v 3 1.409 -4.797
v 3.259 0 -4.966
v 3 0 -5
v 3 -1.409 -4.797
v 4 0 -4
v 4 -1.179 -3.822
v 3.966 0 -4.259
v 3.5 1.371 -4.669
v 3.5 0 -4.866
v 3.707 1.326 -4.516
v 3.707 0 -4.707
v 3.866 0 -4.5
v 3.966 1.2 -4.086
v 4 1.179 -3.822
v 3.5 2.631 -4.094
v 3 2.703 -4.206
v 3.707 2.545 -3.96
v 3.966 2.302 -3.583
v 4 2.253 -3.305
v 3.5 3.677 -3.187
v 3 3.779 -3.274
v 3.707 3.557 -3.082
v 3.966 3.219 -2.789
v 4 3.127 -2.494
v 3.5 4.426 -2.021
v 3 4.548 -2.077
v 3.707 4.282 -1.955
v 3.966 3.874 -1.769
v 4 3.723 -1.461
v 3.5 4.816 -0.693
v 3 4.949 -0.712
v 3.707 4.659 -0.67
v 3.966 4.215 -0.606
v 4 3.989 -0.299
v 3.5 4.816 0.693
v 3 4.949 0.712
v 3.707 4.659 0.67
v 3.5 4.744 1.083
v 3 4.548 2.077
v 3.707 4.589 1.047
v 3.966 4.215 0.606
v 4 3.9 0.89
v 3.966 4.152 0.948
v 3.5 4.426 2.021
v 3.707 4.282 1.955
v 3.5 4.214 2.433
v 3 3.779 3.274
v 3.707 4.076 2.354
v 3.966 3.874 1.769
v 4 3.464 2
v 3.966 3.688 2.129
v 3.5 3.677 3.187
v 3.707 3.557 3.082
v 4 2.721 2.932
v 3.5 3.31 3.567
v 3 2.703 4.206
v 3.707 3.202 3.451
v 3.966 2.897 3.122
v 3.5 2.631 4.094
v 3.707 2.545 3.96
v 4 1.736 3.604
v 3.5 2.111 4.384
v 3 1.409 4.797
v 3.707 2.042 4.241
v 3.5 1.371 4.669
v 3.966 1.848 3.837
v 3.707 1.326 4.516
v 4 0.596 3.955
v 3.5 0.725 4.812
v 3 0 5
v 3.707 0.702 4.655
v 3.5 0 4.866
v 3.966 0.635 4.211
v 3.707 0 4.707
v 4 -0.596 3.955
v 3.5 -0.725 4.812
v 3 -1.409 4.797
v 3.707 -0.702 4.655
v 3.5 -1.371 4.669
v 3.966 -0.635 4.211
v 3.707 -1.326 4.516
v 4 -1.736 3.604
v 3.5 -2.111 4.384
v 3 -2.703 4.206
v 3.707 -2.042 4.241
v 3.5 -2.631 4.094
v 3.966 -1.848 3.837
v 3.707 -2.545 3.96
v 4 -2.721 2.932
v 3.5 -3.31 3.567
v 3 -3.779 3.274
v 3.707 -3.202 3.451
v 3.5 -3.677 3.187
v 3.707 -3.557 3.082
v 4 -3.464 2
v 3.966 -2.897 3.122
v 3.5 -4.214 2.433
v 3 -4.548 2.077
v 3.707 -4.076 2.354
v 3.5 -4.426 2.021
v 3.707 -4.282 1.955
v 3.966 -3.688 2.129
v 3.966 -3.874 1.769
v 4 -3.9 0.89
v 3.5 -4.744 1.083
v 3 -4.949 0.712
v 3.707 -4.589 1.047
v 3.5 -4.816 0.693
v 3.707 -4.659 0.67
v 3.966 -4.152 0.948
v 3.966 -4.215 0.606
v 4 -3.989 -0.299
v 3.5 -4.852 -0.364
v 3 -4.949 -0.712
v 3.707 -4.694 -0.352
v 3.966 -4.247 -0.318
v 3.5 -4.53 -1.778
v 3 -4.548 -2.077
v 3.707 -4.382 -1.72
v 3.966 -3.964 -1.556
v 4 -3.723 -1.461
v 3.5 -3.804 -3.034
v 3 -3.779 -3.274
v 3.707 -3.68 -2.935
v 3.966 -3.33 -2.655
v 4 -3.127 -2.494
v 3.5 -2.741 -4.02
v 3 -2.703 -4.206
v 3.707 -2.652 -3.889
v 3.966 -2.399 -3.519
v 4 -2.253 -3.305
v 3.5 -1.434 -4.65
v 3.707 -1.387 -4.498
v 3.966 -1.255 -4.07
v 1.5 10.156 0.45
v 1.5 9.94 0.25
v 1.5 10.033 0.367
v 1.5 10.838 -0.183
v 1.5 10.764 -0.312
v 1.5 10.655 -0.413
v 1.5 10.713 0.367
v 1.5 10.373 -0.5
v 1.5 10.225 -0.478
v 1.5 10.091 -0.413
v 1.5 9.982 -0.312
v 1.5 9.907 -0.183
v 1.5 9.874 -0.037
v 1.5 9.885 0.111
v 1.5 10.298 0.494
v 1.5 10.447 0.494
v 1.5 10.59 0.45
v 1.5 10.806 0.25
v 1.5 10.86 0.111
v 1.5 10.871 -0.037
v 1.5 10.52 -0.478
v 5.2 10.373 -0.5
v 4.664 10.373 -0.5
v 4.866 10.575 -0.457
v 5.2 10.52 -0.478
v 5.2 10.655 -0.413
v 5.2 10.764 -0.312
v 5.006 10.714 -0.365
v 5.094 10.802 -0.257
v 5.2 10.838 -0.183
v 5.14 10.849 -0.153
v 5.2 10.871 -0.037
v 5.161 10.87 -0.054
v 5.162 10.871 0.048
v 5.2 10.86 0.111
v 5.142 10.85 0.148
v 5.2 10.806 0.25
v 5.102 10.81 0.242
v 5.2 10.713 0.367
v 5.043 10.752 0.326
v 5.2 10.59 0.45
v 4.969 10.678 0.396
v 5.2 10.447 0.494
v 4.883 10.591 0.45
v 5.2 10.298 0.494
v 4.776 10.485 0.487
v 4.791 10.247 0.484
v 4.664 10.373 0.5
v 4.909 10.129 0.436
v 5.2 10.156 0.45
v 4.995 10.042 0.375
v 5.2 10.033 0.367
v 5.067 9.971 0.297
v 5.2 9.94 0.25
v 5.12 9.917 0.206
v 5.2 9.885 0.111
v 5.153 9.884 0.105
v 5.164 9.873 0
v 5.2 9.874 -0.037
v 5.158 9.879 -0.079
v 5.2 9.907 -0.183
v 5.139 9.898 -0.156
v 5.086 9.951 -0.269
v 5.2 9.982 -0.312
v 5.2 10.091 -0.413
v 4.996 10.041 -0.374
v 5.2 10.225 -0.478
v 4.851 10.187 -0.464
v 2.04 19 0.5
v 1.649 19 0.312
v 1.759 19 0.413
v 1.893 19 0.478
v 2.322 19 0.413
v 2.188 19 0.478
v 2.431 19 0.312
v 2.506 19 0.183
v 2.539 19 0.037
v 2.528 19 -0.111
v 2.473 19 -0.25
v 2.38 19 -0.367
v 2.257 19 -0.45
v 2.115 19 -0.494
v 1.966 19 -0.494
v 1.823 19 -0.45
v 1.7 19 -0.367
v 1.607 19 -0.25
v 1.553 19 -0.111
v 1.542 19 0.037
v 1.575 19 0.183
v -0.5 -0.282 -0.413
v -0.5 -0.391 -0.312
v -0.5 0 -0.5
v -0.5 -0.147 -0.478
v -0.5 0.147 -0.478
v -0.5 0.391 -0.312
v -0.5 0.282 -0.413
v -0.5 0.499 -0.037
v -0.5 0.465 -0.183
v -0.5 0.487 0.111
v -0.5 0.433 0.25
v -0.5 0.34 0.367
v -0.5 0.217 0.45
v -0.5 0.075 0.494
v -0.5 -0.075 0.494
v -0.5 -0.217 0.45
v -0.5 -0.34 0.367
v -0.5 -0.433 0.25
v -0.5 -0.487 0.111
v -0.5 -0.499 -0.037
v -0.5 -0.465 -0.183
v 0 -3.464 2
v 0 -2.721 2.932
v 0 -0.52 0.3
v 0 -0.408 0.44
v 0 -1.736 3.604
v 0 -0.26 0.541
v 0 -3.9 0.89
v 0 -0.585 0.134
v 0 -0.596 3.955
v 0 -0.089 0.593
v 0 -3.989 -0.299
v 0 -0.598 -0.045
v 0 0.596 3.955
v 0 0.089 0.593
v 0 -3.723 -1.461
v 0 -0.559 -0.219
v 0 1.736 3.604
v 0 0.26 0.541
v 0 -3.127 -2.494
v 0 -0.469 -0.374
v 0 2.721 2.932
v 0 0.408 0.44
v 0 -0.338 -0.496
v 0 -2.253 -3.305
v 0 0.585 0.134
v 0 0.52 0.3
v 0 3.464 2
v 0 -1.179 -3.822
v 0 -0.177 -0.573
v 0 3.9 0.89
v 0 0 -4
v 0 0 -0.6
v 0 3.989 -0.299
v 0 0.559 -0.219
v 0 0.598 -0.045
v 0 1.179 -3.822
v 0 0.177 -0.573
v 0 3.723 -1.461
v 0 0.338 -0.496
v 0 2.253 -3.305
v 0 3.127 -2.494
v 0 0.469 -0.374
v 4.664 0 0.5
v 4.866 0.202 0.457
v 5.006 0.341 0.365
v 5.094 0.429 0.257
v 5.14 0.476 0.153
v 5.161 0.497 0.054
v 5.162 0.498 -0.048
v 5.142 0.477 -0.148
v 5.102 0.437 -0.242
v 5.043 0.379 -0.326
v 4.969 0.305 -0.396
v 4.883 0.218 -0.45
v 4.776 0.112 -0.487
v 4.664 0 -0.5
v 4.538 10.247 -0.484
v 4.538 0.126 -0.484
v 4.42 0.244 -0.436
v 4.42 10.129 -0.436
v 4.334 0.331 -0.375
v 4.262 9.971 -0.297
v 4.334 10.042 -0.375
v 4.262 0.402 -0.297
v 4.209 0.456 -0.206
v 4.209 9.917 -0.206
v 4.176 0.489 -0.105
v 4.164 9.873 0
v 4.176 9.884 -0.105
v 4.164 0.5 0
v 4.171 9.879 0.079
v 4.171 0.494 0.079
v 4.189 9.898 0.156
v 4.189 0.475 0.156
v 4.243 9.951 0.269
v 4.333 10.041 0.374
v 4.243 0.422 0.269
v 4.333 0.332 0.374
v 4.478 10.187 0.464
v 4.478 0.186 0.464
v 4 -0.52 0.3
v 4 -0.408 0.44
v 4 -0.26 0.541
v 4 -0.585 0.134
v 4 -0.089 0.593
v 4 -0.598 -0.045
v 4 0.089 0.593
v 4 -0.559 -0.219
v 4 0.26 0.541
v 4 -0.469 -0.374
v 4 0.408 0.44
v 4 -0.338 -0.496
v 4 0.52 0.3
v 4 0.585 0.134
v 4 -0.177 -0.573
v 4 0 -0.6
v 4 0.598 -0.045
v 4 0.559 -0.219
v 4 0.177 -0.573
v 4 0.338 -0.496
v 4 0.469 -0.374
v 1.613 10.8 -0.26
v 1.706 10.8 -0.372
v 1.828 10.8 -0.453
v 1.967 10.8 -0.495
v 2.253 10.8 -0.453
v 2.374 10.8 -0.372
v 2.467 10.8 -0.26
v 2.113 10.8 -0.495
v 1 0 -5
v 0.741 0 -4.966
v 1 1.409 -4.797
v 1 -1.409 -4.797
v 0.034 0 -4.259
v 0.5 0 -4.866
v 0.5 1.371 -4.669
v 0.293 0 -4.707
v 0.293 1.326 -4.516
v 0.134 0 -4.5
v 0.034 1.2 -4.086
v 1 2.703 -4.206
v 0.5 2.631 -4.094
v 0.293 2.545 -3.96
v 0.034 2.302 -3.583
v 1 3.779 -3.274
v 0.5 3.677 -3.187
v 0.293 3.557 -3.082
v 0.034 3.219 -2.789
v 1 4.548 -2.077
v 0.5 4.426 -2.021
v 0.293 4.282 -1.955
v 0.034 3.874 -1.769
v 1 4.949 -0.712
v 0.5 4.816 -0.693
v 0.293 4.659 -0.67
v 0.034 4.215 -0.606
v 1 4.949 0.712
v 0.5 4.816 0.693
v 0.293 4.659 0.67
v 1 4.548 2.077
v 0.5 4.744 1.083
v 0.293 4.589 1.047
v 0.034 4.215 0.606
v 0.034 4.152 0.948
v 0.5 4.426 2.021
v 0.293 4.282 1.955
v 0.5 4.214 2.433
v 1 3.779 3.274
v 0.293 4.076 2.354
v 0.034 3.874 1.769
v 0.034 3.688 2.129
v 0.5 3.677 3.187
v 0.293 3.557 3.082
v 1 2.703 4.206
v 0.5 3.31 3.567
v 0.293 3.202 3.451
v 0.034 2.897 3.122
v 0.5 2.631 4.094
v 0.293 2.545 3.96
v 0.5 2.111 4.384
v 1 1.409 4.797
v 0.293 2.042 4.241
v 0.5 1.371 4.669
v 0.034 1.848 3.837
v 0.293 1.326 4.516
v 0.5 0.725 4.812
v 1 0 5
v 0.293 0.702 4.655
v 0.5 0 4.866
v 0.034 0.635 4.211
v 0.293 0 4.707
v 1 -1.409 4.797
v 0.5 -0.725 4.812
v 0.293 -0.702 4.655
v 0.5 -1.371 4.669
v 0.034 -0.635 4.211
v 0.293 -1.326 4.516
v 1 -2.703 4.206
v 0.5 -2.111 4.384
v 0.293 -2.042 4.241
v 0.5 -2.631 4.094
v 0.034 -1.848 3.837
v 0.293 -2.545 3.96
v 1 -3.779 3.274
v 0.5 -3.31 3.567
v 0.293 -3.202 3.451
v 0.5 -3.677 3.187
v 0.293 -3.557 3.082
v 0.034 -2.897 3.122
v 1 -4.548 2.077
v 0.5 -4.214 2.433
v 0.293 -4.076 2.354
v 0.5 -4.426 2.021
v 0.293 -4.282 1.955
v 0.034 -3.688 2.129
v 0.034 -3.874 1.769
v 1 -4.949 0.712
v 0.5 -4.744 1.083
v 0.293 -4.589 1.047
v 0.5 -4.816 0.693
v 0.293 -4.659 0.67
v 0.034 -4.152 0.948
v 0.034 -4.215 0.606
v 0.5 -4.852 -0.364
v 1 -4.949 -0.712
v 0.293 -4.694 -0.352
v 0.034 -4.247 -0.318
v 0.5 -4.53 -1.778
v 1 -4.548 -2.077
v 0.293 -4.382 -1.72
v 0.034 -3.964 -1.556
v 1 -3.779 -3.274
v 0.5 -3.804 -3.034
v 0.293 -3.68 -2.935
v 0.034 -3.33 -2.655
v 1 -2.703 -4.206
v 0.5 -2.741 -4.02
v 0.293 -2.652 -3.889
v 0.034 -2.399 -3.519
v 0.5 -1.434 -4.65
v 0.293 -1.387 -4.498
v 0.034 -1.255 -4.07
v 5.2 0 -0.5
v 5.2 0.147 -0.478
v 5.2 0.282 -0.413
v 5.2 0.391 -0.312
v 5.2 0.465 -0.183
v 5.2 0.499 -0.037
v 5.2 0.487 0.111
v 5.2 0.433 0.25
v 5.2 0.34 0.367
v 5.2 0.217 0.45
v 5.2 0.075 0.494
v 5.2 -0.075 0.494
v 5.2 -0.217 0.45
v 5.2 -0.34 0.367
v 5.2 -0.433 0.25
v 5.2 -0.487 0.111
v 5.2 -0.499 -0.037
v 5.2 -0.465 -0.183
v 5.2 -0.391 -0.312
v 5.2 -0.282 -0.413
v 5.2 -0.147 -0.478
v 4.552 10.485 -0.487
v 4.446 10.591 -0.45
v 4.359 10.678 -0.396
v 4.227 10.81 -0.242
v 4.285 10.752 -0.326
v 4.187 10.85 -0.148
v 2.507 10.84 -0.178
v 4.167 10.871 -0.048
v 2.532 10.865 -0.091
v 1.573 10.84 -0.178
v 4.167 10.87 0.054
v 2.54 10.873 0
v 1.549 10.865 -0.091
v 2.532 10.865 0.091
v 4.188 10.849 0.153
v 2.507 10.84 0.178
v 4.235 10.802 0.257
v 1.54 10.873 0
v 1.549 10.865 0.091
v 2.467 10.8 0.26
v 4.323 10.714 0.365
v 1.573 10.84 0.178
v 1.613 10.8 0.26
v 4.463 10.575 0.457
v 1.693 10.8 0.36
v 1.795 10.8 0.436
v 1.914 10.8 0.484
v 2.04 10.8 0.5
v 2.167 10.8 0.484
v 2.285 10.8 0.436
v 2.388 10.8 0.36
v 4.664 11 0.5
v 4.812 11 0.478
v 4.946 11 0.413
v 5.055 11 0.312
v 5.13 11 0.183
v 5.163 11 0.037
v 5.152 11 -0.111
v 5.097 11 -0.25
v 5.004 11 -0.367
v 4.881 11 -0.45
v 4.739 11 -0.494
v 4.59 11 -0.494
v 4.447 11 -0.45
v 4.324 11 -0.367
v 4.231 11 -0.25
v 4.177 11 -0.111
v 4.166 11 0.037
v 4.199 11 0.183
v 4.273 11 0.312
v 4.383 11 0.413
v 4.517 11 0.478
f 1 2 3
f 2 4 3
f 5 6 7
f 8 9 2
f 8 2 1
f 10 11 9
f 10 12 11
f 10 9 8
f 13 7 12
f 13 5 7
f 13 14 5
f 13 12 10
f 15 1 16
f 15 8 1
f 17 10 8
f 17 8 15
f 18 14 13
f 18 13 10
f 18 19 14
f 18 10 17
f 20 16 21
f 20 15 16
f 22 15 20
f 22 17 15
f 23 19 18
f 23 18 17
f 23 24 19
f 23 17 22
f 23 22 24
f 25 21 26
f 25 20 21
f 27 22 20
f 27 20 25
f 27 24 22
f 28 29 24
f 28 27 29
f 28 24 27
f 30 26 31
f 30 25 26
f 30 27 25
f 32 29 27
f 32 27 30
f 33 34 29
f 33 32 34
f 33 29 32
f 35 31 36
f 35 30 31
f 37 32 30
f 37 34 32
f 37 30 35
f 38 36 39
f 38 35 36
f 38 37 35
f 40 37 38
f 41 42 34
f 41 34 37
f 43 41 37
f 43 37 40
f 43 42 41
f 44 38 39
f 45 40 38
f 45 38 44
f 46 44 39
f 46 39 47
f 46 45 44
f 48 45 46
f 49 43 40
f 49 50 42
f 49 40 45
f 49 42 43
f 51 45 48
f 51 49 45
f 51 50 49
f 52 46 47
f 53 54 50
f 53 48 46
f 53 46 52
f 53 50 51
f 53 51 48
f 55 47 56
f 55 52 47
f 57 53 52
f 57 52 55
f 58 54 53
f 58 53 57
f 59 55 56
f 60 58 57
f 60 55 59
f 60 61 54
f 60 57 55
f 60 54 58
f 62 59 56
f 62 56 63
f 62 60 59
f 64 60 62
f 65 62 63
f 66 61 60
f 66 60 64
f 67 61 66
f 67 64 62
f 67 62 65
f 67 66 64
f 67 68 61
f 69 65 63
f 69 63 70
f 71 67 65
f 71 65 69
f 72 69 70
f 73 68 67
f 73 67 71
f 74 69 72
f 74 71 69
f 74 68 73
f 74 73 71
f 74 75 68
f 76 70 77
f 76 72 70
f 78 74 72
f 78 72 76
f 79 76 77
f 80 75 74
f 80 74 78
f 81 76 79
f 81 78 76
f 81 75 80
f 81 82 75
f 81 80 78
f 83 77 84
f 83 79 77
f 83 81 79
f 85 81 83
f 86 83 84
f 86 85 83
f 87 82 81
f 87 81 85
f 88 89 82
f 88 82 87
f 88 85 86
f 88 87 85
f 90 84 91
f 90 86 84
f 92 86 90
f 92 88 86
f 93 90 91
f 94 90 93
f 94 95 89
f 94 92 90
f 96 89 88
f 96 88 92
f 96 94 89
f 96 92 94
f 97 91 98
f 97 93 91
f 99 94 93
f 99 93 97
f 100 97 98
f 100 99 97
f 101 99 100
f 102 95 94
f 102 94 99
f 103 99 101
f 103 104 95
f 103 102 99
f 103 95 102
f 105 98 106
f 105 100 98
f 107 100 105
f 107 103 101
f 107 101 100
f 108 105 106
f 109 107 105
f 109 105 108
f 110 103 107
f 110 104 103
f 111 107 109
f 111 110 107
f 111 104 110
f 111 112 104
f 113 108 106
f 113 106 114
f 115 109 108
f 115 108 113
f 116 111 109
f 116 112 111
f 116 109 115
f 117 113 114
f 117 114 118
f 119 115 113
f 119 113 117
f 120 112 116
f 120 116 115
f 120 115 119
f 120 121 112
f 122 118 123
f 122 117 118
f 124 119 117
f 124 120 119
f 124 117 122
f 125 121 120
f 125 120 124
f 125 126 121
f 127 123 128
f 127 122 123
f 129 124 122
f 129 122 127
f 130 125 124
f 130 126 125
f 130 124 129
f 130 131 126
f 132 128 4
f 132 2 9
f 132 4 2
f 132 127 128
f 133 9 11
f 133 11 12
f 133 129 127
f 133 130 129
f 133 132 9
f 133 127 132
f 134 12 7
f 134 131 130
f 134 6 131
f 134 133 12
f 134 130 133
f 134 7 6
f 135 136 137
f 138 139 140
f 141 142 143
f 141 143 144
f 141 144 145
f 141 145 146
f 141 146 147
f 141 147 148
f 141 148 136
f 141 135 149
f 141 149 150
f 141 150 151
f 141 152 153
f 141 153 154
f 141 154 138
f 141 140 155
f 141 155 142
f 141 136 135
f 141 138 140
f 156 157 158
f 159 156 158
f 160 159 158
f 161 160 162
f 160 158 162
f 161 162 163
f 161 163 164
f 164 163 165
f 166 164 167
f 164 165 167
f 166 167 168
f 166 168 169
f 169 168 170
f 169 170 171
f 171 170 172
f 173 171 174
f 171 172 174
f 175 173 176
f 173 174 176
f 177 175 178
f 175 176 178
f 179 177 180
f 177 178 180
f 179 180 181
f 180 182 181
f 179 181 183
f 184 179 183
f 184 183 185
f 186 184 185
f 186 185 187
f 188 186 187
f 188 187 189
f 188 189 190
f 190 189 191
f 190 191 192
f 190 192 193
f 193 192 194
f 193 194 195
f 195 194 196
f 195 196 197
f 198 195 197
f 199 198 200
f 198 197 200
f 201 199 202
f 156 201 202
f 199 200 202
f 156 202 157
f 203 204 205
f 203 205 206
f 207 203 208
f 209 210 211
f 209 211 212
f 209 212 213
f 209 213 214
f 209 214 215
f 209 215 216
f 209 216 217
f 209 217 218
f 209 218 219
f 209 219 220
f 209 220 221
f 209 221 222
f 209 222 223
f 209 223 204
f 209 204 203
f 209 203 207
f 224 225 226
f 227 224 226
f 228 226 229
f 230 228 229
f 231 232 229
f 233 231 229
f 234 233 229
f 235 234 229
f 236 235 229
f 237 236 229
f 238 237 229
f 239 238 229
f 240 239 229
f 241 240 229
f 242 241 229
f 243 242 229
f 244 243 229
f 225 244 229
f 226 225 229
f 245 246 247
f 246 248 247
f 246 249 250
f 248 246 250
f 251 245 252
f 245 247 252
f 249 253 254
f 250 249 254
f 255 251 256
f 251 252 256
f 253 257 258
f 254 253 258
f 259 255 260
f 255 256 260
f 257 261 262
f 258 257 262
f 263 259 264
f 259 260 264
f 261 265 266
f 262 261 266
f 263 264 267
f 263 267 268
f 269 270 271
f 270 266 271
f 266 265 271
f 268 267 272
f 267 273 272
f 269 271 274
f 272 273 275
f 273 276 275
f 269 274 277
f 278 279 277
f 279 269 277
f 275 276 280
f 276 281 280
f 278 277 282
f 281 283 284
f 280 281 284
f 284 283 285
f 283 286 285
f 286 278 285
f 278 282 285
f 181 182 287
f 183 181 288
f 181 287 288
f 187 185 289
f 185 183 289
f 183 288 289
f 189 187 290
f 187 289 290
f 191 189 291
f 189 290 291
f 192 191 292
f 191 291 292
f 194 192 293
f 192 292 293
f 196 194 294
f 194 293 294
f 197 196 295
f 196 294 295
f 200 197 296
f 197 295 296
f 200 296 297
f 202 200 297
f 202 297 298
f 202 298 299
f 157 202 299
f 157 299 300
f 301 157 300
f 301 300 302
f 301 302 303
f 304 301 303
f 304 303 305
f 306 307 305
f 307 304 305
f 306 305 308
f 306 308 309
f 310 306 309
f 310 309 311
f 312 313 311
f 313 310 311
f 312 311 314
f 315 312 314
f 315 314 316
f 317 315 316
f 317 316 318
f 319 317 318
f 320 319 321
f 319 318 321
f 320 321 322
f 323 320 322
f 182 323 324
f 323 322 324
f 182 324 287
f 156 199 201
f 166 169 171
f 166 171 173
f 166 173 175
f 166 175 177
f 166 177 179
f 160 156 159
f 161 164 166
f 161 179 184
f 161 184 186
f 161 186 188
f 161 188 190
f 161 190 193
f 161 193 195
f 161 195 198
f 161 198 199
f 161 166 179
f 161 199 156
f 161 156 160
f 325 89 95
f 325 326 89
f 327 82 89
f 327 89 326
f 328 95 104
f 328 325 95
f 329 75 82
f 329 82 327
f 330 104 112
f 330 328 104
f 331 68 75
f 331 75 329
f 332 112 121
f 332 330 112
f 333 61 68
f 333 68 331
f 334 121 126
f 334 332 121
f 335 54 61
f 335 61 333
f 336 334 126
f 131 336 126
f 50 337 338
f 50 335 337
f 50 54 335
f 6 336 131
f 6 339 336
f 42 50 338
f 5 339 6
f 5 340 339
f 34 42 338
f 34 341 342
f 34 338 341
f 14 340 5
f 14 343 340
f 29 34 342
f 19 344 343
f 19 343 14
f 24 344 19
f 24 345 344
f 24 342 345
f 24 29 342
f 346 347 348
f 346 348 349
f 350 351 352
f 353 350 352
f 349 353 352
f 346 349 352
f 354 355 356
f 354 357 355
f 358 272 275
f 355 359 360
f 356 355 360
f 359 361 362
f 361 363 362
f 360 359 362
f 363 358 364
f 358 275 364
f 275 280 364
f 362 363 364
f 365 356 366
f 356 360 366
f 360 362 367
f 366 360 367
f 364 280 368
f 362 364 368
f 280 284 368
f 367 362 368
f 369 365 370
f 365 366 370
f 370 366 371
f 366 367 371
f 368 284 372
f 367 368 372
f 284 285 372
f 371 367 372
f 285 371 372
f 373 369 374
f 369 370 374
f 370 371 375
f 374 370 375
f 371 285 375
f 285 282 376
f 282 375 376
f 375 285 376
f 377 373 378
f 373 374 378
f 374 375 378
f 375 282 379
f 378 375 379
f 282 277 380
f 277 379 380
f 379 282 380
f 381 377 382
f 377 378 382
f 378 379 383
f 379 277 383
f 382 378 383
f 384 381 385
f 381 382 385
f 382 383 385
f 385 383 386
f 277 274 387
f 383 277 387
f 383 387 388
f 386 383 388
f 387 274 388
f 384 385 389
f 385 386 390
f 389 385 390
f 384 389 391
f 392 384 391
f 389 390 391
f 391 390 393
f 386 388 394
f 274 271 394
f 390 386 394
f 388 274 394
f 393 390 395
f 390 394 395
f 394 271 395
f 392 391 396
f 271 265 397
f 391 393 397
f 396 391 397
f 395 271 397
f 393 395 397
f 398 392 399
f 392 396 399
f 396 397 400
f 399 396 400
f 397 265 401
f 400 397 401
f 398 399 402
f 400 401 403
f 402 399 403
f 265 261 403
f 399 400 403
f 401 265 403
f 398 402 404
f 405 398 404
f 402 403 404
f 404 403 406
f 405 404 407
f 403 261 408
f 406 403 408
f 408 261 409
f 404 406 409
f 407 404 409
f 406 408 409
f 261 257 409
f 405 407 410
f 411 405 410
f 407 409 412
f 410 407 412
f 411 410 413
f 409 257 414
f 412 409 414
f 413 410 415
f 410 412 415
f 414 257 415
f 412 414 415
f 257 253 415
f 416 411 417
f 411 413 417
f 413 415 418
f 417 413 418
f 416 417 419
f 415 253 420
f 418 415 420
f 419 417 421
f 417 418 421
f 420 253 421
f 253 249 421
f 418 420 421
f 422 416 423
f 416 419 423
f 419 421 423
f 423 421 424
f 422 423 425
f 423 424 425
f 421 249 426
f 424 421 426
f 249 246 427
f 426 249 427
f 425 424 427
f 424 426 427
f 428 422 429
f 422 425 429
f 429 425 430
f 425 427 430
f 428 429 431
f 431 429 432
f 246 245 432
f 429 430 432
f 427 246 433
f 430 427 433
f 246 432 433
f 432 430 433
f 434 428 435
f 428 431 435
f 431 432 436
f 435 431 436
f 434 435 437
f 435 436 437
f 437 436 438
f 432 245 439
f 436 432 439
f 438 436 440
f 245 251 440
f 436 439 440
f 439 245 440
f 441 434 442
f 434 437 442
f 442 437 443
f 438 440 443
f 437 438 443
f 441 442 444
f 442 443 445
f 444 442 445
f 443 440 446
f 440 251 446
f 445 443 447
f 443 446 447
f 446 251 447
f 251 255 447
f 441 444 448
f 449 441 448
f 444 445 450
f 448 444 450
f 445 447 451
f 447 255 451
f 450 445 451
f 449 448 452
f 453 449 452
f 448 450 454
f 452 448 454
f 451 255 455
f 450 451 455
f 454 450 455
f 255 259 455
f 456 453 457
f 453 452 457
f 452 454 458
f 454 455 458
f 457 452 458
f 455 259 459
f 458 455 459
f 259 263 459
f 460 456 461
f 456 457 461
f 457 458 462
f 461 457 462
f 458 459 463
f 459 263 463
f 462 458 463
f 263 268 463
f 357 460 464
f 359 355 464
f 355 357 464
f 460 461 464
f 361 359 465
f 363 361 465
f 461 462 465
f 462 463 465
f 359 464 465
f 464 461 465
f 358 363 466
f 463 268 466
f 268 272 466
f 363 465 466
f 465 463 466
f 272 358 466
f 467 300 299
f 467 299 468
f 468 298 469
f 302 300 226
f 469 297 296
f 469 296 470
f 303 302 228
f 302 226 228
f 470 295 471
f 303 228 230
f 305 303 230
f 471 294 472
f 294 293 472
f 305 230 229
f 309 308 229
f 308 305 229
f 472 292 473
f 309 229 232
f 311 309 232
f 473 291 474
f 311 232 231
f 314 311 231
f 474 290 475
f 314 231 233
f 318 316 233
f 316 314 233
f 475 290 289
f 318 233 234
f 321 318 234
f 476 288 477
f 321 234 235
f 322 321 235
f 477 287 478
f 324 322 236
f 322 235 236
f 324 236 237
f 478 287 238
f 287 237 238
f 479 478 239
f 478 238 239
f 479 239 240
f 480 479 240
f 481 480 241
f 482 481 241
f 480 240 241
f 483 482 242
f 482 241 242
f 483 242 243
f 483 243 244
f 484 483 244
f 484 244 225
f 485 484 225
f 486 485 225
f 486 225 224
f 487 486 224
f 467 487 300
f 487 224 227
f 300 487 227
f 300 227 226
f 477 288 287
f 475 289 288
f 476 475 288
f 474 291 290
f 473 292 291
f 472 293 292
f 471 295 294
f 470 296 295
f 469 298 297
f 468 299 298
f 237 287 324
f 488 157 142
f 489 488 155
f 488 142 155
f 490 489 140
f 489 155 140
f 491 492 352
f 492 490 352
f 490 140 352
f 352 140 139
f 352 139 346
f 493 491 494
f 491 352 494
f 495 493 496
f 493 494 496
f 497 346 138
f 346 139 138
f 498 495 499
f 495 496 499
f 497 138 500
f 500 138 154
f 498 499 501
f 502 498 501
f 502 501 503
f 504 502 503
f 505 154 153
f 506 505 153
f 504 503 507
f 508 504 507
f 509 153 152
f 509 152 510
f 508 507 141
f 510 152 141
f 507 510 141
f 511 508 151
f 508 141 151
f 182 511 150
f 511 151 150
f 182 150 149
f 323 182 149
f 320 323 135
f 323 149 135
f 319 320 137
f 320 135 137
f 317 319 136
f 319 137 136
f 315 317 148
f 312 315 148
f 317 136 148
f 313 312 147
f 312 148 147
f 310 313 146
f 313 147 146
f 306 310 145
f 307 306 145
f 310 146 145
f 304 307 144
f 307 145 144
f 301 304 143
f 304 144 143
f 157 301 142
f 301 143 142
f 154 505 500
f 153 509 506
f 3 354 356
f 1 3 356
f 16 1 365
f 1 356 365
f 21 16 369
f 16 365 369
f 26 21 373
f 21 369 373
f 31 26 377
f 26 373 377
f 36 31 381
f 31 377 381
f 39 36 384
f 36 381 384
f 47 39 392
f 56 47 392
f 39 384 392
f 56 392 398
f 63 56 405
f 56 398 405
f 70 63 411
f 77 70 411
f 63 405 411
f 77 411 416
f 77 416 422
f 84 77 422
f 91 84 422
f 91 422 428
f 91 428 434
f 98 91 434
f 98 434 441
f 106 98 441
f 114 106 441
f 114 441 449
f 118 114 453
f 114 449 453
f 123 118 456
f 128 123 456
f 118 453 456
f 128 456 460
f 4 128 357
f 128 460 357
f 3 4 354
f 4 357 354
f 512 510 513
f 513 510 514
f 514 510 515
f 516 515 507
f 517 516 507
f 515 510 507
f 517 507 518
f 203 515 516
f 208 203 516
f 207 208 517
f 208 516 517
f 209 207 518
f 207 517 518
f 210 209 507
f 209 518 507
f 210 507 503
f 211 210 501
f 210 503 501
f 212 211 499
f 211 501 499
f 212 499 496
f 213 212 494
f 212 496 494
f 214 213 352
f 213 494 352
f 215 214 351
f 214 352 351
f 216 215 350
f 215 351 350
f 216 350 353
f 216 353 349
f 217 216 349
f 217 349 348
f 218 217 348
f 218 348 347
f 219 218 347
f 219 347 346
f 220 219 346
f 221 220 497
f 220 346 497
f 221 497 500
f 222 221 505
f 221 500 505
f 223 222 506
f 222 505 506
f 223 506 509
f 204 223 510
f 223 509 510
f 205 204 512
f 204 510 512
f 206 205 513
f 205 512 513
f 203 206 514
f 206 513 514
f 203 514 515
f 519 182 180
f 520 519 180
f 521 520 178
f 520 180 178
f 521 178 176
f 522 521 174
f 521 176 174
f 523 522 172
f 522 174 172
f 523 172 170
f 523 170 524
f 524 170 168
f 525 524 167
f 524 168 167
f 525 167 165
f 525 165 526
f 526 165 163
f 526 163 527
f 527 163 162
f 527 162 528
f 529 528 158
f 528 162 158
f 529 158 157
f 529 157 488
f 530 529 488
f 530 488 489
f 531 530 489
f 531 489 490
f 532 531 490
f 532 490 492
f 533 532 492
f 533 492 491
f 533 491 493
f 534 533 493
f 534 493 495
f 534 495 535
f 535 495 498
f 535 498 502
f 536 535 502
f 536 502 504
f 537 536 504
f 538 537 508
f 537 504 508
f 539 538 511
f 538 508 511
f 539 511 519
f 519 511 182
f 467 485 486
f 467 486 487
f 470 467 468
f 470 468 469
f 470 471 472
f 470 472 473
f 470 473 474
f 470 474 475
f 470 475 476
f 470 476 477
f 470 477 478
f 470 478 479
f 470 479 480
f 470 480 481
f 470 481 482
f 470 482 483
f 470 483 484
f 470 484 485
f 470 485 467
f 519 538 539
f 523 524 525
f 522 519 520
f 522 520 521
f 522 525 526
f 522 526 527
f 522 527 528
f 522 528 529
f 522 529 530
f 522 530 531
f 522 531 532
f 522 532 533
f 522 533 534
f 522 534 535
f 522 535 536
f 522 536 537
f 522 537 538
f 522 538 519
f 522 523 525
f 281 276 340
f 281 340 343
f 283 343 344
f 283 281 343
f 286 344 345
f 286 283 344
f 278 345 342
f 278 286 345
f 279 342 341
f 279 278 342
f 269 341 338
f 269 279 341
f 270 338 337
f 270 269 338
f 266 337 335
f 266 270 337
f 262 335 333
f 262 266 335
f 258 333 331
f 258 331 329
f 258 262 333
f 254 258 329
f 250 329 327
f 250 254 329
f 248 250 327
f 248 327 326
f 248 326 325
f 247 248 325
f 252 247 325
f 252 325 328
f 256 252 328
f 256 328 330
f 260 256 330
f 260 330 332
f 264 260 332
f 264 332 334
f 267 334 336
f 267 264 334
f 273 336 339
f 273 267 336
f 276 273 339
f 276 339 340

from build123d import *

# Parameters (mm, degrees)
SKETCH1_R                = 5
SKETCH1_R_2              = 0.6
BOSS_EXTRUDE1_DEPTH      = 4
FILLET1_R                = 1
FILLET2_R                = 1
BOSS_EXTRUDE2_DEPTH      = 5.2
BOSS_EXTRUDE2_DEPTH_BACK = 0.5
SKETCH2_R                = 0.5
SKETCH3_R                = 0.5
BOSS_EXTRUDE3_DEPTH      = 11
SKETCH5_R                = 0.5
BOSS_EXTRUDE4_DEPTH      = 5.2
BOSS_EXTRUDE6_DEPTH      = 3
BOSS_EXTRUDE6_DEPTH_BACK = 5.2
SKETCH7_R                = 0.5
SKETCH8_W                = 7.726432721
SKETCH8_H                = 3.897197193
CUT_EXTRUDE1_DEPTH       = 1.5


with BuildPart() as part:
    # Sketch1 → Boss-Extrude1 (new body)
    with BuildSketch(Plane(origin=(0, 0, 0), x_dir=(0, 0, -1), z_dir=(1, 0, 0))):
        Circle(SKETCH1_R)
        Circle(SKETCH1_R_2, mode=Mode.SUBTRACT)
    extrude(amount=BOSS_EXTRUDE1_DEPTH)

    # Fillet1
    fillet1_edges = [part.edges().sort_by_distance(p)[0] for p in [
        (0, 0, 5),
    ]]
    fillet(fillet1_edges, radius=FILLET1_R)

    # Fillet2
    fillet2_edges = [part.edges().sort_by_distance(p)[0] for p in [
        (4, 0, 5),
    ]]
    fillet(fillet2_edges, radius=FILLET2_R)


with BuildPart() as body_2:
    # Sketch2 → Boss-Extrude2 (new, two sides: drawn at the far end of the back side and taken through both)
    with BuildSketch(Plane(origin=(0, 0, 0), x_dir=(0, 0, -1), z_dir=(1, 0, 0)).offset(-BOSS_EXTRUDE2_DEPTH_BACK)):
        Circle(SKETCH2_R)
    extrude(amount=BOSS_EXTRUDE2_DEPTH + BOSS_EXTRUDE2_DEPTH_BACK)

    # Sketch3 → Boss-Extrude3 (add)
    with BuildSketch(Plane(origin=(0, 0, 0), x_dir=(1, 0, 0), z_dir=(0, 1, 0))):
        with Locations(Location((4.664349938, 0, 0), (0, 0, 270))):
            Circle(SKETCH3_R)
    extrude(amount=BOSS_EXTRUDE3_DEPTH)

    # Sketch5 → Boss-Extrude4 (add)
    with BuildSketch(Plane(origin=(0, 0, 0), x_dir=(0, 0, -1), z_dir=(1, 0, 0))):
        with Locations((0, 10.37285766)):
            Circle(SKETCH5_R)
    extrude(amount=BOSS_EXTRUDE4_DEPTH)

    # Sketch7 → Boss-Extrude6 (add, two sides: drawn at the far end of the back side and taken through both)
    with BuildSketch(Plane(origin=(0, 16, 0), x_dir=(1, 0, 0), z_dir=(0, 1, 0)).offset(-BOSS_EXTRUDE6_DEPTH_BACK)):
        with Locations(Location((2.040329442, 0, 0), (0, 0, 270))):
            Circle(SKETCH7_R)
    extrude(amount=BOSS_EXTRUDE6_DEPTH + BOSS_EXTRUDE6_DEPTH_BACK)

    # Sketch8 → Cut-Extrude1 (cut)
    with BuildSketch(Plane.ZY):
        with Locations((-1.600922228, 9.943451596)):
            Rectangle(SKETCH8_W, SKETCH8_H)
    extrude(amount=-CUT_EXTRUDE1_DEPTH, mode=Mode.SUBTRACT)


solid = Compound([part.part, body_2.part])
